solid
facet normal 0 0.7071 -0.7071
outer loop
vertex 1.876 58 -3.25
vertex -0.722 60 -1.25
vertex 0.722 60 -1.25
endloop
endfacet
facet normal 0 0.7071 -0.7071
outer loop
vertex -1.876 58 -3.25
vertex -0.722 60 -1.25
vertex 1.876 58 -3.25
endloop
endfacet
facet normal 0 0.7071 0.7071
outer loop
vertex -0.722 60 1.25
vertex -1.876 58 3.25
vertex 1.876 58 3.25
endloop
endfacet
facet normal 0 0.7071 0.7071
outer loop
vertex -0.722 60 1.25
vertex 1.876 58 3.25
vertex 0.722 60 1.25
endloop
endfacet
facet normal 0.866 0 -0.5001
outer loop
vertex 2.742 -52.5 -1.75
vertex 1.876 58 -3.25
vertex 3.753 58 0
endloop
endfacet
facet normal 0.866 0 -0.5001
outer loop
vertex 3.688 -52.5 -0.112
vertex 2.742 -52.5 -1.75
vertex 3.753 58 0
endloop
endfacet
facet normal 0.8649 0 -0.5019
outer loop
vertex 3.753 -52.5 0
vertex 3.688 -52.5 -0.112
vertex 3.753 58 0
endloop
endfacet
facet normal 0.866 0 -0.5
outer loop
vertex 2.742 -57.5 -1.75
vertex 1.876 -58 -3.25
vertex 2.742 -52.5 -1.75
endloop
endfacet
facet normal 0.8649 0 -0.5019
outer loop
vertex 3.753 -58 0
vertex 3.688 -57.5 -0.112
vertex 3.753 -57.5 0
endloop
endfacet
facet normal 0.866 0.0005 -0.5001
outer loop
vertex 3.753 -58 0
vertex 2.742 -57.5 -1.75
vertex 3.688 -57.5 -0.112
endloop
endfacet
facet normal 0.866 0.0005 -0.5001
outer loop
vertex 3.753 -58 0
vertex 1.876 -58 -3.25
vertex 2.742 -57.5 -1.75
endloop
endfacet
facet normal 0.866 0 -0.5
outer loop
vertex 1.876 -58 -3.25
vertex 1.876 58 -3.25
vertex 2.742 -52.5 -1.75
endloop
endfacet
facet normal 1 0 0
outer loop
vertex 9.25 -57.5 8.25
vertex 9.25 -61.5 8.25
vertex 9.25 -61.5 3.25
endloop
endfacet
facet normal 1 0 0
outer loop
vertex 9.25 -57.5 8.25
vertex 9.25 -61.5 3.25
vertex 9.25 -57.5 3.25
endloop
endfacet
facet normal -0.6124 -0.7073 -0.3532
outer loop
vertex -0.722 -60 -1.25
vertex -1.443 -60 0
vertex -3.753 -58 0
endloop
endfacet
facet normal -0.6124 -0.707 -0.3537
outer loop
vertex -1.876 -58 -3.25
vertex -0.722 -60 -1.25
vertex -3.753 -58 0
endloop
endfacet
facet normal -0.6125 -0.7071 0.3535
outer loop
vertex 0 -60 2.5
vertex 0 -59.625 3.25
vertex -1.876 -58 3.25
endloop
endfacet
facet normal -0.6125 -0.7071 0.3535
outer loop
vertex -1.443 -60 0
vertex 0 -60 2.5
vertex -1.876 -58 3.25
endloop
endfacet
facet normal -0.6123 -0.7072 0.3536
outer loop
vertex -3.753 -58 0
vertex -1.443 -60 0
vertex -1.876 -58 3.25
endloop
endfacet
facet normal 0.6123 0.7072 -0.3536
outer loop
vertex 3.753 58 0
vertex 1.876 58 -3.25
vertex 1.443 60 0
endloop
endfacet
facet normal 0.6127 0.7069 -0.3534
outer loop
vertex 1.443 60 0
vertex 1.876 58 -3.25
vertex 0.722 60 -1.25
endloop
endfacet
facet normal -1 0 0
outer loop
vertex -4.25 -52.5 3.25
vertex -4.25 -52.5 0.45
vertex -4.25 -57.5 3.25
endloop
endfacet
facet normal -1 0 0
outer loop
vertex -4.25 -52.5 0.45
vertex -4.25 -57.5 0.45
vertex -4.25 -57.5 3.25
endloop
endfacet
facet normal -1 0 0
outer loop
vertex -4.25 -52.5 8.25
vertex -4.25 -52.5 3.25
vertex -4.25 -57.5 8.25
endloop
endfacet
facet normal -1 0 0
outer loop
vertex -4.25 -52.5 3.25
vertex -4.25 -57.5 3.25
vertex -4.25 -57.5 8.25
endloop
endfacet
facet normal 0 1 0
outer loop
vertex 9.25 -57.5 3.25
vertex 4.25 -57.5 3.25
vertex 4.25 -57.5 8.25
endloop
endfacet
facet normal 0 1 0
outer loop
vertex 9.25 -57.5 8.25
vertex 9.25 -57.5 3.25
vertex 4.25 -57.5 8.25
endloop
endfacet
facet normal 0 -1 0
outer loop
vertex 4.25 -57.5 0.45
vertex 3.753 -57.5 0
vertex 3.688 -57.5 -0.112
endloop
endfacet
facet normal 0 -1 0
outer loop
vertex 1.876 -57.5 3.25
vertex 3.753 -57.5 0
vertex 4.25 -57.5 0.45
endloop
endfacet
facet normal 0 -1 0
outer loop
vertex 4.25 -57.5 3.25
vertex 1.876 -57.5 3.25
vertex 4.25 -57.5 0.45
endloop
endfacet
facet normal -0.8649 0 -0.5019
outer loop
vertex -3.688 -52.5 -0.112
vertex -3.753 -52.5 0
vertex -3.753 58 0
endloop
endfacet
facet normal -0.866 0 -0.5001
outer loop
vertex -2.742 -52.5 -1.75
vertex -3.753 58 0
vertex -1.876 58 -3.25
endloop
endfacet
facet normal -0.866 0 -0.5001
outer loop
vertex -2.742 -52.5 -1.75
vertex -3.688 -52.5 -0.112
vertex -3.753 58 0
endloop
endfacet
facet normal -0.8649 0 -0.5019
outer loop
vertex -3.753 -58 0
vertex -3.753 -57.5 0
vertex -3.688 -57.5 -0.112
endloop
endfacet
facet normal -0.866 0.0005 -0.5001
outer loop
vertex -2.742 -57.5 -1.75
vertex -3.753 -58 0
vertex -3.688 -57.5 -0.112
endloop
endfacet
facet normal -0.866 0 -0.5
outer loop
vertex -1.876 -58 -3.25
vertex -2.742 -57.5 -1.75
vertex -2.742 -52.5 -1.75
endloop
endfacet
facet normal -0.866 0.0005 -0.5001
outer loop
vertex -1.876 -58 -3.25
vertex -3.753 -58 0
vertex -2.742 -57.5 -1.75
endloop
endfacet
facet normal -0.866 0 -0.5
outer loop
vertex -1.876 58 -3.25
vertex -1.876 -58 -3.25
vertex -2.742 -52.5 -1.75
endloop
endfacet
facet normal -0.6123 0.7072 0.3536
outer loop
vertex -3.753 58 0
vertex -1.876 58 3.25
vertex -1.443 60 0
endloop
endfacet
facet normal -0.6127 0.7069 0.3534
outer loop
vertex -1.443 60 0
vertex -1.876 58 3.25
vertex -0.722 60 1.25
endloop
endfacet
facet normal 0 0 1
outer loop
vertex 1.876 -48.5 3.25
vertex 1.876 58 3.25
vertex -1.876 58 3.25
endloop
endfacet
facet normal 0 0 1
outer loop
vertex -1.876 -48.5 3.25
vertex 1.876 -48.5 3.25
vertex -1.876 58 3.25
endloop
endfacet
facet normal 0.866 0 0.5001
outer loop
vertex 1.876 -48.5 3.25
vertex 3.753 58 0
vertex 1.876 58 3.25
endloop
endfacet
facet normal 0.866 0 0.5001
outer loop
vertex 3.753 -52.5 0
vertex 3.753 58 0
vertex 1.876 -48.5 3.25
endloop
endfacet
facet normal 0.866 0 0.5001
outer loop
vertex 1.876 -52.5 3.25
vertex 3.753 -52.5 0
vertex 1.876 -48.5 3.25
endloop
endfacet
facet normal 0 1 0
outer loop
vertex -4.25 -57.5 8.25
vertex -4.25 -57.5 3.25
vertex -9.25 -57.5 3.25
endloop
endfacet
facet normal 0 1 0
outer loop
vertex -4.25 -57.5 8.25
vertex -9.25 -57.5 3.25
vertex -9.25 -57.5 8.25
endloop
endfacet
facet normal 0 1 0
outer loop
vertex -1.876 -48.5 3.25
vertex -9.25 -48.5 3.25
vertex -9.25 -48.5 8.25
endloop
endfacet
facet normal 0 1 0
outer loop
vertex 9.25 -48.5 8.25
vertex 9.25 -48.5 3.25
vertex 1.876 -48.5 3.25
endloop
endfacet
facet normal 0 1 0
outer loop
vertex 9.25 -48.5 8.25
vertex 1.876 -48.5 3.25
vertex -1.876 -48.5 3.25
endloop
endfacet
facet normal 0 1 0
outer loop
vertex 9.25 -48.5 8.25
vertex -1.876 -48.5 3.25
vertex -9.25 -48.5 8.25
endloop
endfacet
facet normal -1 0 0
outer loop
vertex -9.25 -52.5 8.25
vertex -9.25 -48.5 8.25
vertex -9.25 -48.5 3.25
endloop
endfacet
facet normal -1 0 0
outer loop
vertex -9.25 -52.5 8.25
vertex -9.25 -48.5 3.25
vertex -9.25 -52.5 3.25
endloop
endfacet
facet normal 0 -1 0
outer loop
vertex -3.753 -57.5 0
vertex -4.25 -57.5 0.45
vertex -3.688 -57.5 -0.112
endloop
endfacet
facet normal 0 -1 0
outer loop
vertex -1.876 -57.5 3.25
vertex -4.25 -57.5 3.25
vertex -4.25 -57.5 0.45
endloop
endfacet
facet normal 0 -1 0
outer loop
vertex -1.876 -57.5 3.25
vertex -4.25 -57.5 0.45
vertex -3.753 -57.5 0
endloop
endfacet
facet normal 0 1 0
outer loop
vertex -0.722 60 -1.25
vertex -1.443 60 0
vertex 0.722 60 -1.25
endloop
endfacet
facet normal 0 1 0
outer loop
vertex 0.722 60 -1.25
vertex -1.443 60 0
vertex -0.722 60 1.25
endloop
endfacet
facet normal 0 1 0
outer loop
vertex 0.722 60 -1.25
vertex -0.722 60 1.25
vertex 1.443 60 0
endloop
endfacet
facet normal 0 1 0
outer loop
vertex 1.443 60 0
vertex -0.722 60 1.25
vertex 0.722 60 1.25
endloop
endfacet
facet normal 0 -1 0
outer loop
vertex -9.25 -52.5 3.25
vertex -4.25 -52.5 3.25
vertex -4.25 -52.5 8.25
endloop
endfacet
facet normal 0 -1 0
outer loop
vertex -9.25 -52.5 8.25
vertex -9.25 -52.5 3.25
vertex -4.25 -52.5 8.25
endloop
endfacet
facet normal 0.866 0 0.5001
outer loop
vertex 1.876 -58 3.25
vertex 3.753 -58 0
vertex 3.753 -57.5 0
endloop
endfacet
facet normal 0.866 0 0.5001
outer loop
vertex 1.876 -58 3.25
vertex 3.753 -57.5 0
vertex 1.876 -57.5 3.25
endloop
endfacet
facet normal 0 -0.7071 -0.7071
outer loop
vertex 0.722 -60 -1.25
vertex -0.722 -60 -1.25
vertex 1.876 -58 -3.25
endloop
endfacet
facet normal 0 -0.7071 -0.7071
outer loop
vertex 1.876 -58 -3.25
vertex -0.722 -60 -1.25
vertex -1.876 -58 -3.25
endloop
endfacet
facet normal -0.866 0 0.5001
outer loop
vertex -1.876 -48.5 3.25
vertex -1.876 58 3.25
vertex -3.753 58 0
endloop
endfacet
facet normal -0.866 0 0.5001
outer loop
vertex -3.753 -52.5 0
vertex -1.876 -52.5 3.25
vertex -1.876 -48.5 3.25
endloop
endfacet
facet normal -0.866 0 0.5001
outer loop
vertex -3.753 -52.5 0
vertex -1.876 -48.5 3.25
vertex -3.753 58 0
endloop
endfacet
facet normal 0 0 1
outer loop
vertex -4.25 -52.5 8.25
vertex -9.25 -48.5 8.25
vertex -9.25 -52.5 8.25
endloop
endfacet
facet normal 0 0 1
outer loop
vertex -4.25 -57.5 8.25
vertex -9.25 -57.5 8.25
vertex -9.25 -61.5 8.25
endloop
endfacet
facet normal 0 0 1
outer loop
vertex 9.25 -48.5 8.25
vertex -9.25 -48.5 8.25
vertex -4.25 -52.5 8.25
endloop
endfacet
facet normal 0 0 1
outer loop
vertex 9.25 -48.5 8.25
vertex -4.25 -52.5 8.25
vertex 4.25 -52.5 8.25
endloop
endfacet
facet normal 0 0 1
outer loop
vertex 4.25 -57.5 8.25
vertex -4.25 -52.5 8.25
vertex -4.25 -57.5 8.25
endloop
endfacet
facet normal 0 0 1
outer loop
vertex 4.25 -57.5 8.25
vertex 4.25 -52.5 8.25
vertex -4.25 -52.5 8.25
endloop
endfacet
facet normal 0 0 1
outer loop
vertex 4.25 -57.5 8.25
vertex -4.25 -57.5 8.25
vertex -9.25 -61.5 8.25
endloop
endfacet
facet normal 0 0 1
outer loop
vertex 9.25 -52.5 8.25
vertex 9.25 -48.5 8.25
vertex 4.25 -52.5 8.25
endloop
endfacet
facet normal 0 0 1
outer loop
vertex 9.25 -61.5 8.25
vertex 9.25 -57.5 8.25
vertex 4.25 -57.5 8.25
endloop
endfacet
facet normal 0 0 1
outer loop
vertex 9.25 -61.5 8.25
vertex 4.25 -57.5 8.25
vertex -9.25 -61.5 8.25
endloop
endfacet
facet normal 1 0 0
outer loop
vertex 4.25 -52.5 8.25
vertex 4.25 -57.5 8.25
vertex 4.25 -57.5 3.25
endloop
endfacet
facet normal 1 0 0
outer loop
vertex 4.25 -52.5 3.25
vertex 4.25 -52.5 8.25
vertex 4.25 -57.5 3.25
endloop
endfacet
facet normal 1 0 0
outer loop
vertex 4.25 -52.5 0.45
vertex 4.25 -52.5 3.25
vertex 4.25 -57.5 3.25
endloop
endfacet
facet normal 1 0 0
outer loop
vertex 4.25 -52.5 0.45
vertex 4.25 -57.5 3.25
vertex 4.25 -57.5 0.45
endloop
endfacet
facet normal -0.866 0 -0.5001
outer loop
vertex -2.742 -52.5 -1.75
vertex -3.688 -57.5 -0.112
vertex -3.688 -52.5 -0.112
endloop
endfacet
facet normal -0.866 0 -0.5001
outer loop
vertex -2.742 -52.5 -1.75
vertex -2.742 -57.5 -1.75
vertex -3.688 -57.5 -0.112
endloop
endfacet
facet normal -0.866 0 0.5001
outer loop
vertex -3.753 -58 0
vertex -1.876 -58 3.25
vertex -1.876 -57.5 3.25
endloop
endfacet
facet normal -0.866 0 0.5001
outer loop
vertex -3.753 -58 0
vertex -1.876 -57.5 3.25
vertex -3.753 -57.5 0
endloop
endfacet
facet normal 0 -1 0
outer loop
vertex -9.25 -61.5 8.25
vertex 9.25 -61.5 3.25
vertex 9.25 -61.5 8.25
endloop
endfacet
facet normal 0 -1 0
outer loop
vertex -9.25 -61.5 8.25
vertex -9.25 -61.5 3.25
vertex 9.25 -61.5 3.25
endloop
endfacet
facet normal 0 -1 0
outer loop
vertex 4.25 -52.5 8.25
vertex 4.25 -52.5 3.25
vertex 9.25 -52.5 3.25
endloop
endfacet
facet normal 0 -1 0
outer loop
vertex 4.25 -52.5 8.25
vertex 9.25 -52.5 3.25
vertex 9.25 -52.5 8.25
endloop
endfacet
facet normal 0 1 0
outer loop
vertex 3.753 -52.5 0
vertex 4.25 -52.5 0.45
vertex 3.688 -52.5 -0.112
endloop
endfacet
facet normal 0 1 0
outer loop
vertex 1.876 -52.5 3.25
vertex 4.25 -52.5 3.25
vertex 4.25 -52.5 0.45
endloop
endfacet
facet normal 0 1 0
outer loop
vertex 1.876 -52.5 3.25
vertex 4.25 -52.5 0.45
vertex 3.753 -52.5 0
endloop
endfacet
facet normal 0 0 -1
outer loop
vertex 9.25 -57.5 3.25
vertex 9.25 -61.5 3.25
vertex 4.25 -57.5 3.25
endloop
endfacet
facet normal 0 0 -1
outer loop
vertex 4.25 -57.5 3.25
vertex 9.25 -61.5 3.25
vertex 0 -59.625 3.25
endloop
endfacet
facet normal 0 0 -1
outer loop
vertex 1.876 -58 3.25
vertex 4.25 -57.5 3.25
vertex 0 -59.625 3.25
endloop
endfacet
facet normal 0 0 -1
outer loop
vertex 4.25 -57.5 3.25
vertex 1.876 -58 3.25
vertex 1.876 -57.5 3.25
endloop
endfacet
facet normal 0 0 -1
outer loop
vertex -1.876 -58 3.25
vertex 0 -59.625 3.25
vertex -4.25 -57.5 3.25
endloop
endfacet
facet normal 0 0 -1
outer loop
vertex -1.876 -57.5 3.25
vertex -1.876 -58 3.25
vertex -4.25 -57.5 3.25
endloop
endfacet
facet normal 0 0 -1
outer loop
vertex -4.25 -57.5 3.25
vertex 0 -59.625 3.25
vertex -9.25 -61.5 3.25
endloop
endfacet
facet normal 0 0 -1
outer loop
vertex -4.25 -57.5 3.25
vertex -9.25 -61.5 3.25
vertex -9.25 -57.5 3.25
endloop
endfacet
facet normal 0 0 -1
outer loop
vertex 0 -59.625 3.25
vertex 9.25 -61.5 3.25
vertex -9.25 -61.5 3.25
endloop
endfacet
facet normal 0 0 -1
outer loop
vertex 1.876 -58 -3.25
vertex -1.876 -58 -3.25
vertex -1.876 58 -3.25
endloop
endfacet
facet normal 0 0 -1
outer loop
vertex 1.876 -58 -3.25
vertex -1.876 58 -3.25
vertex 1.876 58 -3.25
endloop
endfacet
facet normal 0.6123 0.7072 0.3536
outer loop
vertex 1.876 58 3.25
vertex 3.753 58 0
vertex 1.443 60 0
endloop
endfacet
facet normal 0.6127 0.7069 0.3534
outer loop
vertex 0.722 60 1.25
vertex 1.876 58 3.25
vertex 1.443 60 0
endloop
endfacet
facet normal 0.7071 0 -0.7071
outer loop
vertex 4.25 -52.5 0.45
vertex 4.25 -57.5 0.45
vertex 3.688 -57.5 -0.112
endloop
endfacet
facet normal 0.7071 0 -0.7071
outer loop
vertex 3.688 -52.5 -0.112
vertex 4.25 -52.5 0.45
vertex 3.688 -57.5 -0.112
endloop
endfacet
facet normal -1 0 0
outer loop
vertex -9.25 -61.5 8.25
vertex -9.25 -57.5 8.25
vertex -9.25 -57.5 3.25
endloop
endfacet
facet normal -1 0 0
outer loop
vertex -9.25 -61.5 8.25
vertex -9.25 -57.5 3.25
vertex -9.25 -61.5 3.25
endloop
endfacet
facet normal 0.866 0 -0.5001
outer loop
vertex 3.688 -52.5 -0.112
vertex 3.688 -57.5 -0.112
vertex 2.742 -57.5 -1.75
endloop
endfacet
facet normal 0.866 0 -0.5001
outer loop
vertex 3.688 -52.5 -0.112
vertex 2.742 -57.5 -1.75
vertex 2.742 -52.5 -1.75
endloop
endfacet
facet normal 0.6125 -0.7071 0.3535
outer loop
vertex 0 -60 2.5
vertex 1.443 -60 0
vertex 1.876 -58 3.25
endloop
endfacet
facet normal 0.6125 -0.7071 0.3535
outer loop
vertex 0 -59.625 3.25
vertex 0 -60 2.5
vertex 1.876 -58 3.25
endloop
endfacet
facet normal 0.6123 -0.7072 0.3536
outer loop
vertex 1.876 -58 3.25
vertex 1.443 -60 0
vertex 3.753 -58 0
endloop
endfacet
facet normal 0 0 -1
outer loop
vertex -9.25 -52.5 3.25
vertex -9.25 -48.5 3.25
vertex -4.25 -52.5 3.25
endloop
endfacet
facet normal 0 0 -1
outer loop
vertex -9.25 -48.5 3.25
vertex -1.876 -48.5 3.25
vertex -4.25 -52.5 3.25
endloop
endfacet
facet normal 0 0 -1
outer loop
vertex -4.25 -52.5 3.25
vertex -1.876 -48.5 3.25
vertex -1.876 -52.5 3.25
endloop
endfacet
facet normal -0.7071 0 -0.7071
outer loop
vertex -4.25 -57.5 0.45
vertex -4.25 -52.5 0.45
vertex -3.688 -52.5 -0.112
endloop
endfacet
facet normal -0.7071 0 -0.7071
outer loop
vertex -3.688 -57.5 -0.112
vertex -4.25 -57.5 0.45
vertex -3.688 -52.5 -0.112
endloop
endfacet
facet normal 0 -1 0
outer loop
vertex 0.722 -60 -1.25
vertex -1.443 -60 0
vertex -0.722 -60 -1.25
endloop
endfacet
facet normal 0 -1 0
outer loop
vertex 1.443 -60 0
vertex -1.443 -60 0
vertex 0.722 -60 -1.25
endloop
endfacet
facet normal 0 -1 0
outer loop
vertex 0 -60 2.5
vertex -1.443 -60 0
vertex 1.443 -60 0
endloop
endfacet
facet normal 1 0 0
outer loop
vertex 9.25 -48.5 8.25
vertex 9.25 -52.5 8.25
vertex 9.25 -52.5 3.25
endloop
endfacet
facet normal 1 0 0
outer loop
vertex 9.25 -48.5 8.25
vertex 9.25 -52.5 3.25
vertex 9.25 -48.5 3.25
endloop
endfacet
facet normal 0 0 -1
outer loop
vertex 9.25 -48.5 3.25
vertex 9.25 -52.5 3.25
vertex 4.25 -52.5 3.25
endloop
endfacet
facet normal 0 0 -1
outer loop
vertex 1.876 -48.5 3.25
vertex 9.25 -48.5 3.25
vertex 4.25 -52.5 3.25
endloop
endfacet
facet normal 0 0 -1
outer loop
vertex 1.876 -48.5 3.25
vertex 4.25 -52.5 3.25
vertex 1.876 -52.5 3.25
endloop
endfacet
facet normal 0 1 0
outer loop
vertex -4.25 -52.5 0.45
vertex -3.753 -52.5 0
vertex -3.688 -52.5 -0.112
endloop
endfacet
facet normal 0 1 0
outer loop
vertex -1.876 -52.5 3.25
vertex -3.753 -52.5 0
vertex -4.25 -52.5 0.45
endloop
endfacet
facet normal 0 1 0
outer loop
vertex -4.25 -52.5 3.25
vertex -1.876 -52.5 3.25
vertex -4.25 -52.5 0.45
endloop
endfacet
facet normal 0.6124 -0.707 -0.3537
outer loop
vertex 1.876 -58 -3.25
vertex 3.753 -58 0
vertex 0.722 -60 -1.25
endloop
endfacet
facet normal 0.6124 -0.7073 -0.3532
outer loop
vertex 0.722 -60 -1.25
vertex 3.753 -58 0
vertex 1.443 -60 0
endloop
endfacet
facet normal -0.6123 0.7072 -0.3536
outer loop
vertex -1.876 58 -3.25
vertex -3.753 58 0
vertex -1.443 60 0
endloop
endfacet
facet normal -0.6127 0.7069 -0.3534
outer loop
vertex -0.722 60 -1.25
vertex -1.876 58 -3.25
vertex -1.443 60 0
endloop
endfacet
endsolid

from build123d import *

# Parameters (mm, degrees)
F1_DEPTH      = 60
F2_W          = 2.3736116251
F2_H          = 5
F2_W_2        = 3.7527767497
F3_DEPTH      = 5
F5_DEPTH      = 4
F7_DEPTH      = 4
F8_W          = 4
F8_H          = 5
F9_DEPTH      = 5
F10_W         = 4
F10_H         = 5
F11_DEPTH     = 5
F12_T4_DEPTH  = 16.3154051471
F12_T9_DEPTH  = 16.3154051471
F13_T1_DEPTH  = 14.0395087016
F13_T3_DEPTH  = 14.0395087016
F13_T5_DEPTH  = 14.0395087016
F13_T7_DEPTH  = 14.0395087016
F13_T9_DEPTH  = 14.0395087016
F13_T14_DEPTH = 14.0395087016
F13_T19_DEPTH = 14.0395087016
F13_T24_DEPTH = 14.0395087016
F13_T29_DEPTH = 14.0395087016


# Not quite as in the source:
# - a fillet or chamfer that OpenCascade refuses, or shapes differently, is made with other operations: its cross-section is extruded or revolved along the edge and cut away or added


with BuildPart() as f1:
    # F0 (on Front) → F1 (new body, symmetric)
    with BuildSketch(Plane.XZ):
        Polygon((1.8763883749, -3.25), (3.7527767497, 0), (1.8763883749, 3.25), (-1.8763883749, 3.25), (-3.7527767497, 0), (-1.8763883749, -3.25), align=None)
    extrude(amount=F1_DEPTH, both=True)

    # F2 (on face) → F3 (join, symmetric)
    with BuildSketch(Plane.XY.offset(3.25)):
        with Locations((-3.0631941874, -55)):
            Rectangle(F2_W, F2_H)
        with Locations((0, -55)):
            Rectangle(F2_W_2, F2_H)
        with Locations((3.0631941874, -55)):
            Rectangle(F2_W, F2_H)
    extrude(amount=F3_DEPTH, both=True)

    # F4 (on face) → F5 (join)
    with BuildSketch(Plane.XZ.offset(57.5)):
        Polygon((-4.25, 8.25), (-4.25, 3.25), (-1.8763883749, 3.25), (1.8763883749, 3.25), (4.25, 3.25), (4.25, 8.25), align=None)
    extrude(amount=F5_DEPTH)

    # F6 (on face) → F7 (join)
    with BuildSketch(Plane(origin=(0, -52.5, 0), x_dir=(-1, 0, 0), z_dir=(0, 1, 0))):
        Polygon((-4.25, 8.25), (-4.25, 3.25), (-1.8763883749, 3.25), (1.8763883749, 3.25), (4.25, 3.25), (4.25, 8.25), align=None)
    extrude(amount=F7_DEPTH)

    # F8 (on face) → F9 (join)
    with BuildSketch(Plane.YZ.offset(4.25)):
        with Locations((-59.5, 5.75)):
            Rectangle(F8_W, F8_H)
        with Locations((-50.5, 5.75)):
            Rectangle(F8_W, F8_H)
    extrude(amount=F9_DEPTH)

    # F10 (on face) → F11 (join)
    with BuildSketch(Plane(origin=(-4.25, 0, 0), x_dir=(0, -1, 0), z_dir=(-1, 0, 0))):
        with Locations((50.5, 5.75)):
            Rectangle(F10_W, F10_H)
        with Locations((59.5, 5.75)):
            Rectangle(F10_W, F10_H)
    extrude(amount=F11_DEPTH)

    # F12: chamfer of 2.2 on 2 edges, made by hand


with BuildPart() as f12_tool2:
    # F12_s3 → F12_t4 (new body)
    with BuildSketch(Plane.XZ.offset(63.1577025735)):
        Polygon((4.25, 0.45), (2.05, -1.75), (4.25, -1.75), align=None)
    extrude(amount=-F12_T4_DEPTH)

    split(bisect_by=Plane(origin=(2.8145825623, 0, -1.625), x_dir=(0, 1, 0), z_dir=(0.8660254038, 0, -0.5)), keep=Keep.TOP)


with BuildPart() as f1_1:
    add(f1.part)

    # F12_t1: cut F12_tool2
    add(f12_tool2.part, mode=Mode.SUBTRACT)


with BuildPart() as f12_tool7:
    # F12_s8 → F12_t9 (new body)
    with BuildSketch(Plane.XZ.offset(46.8422974265)):
        Polygon((-4.25, 0.45), (-2.05, -1.75), (-4.25, -1.75), align=None)
    extrude(amount=F12_T9_DEPTH)

    split(bisect_by=Plane(origin=(-2.8145825623, 0, -1.625), x_dir=(0, 1, 0), z_dir=(-0.8660254038, 0, -0.5)), keep=Keep.TOP)


with BuildPart() as f1_2:
    add(f1_1.part)

    # F12_t6: cut F12_tool7
    add(f12_tool7.part, mode=Mode.SUBTRACT)

    # F13: chamfer of 2 on 11 edges, made by hand

    # F13_s2 → F13_t1 (cut)
    with BuildSketch(Plane(origin=(-3.5098771754, 0, -6.0792855961), x_dir=(0, 1, 0), z_dir=(0.5, 0, 0.8660254038))):
        Polygon((58, -3.25), (60, -1.25), (60, -3.25), align=None)
    extrude(amount=F13_T1_DEPTH, mode=Mode.SUBTRACT)

    # F13_s4 → F13_t3 (cut)
    with BuildSketch(Plane(origin=(3.5098771754, 0, -6.0792855961), x_dir=(0, 1, 0), z_dir=(-0.5, 0, 0.8660254038))):
        Polygon((58, -3.25), (60, -1.25), (60, -3.25), align=None)
    extrude(amount=F13_T3_DEPTH, mode=Mode.SUBTRACT)

    # F13_s6 → F13_t5 (cut)
    with BuildSketch(Plane.YZ.offset(-7.0197543508)):
        Polygon((58, 3.25), (60, 1.25), (60, 3.25), align=None)
        Polygon((60, -1.25), (58, -3.25), (60, -3.25), align=None)
        Polygon((-60, -1.25), (-58, -3.25), (-60, -3.25), align=None)
    extrude(amount=F13_T5_DEPTH, mode=Mode.SUBTRACT)

    # F13_s8 → F13_t7 (cut)
    with BuildSketch(Plane(origin=(3.5098771754, 0, 6.0792855961), x_dir=(0, 1, 0), z_dir=(-0.5, 0, -0.8660254038))):
        Polygon((58, -3.25), (60, -1.25), (60, -3.25), align=None)
    extrude(amount=F13_T7_DEPTH, mode=Mode.SUBTRACT)

    # F13_s10 → F13_t9 (cut)
    with BuildSketch(Plane(origin=(-3.5098771754, 0, 6.0792855961), x_dir=(0, 1, 0), z_dir=(0.5, 0, -0.8660254038))):
        Polygon((58, -3.25), (60, -1.25), (60, -3.25), align=None)
    extrude(amount=F13_T9_DEPTH, mode=Mode.SUBTRACT)


with BuildPart() as f13_tool12:
    # F13_s13 → F13_t14 (new body)
    with BuildSketch(Plane(origin=(-3.5098771754, 0, 6.0792855961), x_dir=(0, 1, 0), z_dir=(0.5, 0, -0.8660254038))):
        Polygon((-60, -1.25), (-58, -3.25), (-60, -3.25), align=None)
    extrude(amount=F13_T14_DEPTH)

    split(bisect_by=Plane.XY.offset(3.25), keep=Keep.BOTTOM)


with BuildPart() as f1_3:
    add(f1_2.part)

    # F13_t11: cut F13_tool12
    add(f13_tool12.part, mode=Mode.SUBTRACT)


with BuildPart() as f13_tool17:
    # F13_s18 → F13_t19 (new body)
    with BuildSketch(Plane(origin=(3.5098771754, 0, 6.0792855961), x_dir=(0, 1, 0), z_dir=(-0.5, 0, -0.8660254038))):
        Polygon((-58, 3.25), (-60, 1.25), (-60, 3.25), align=None)
    extrude(amount=F13_T19_DEPTH)

    split(bisect_by=Plane(origin=(2.8145825623, 0, 1.625), x_dir=(0, 1, 0), z_dir=(-0.8660254038, 0, -0.5)), keep=Keep.TOP)


with BuildPart() as f1_4:
    add(f1_3.part)

    # F13_t16: cut F13_tool17
    add(f13_tool17.part, mode=Mode.SUBTRACT)


with BuildPart() as f13_tool22:
    # F13_s23 → F13_t24 (new body)
    with BuildSketch(Plane(origin=(3.5098771754, 0, -6.0792855961), x_dir=(0, 1, 0), z_dir=(-0.5, 0, 0.8660254038))):
        Polygon((-60, -1.25), (-58, -3.25), (-60, -3.25), align=None)
    extrude(amount=F13_T24_DEPTH)

    split(bisect_by=Plane.XY.offset(3.25), keep=Keep.BOTTOM)


with BuildPart() as f1_5:
    add(f1_4.part)

    # F13_t21: cut F13_tool22
    add(f13_tool22.part, mode=Mode.SUBTRACT)


with BuildPart() as f13_tool27:
    # F13_s28 → F13_t29 (new body)
    with BuildSketch(Plane(origin=(3.5098771754, 0, 6.0792855961), x_dir=(0, 1, 0), z_dir=(-0.5, 0, -0.8660254038))):
        Polygon((-60, -1.25), (-58, -3.25), (-60, -3.25), align=None)
    extrude(amount=F13_T29_DEPTH)

    split(bisect_by=Plane.XY.offset(3.25), keep=Keep.BOTTOM)


with BuildPart() as f1_6:
    add(f1_5.part)

    # F13_t26: cut F13_tool27
    add(f13_tool27.part, mode=Mode.SUBTRACT)


solid = f1_6.part
